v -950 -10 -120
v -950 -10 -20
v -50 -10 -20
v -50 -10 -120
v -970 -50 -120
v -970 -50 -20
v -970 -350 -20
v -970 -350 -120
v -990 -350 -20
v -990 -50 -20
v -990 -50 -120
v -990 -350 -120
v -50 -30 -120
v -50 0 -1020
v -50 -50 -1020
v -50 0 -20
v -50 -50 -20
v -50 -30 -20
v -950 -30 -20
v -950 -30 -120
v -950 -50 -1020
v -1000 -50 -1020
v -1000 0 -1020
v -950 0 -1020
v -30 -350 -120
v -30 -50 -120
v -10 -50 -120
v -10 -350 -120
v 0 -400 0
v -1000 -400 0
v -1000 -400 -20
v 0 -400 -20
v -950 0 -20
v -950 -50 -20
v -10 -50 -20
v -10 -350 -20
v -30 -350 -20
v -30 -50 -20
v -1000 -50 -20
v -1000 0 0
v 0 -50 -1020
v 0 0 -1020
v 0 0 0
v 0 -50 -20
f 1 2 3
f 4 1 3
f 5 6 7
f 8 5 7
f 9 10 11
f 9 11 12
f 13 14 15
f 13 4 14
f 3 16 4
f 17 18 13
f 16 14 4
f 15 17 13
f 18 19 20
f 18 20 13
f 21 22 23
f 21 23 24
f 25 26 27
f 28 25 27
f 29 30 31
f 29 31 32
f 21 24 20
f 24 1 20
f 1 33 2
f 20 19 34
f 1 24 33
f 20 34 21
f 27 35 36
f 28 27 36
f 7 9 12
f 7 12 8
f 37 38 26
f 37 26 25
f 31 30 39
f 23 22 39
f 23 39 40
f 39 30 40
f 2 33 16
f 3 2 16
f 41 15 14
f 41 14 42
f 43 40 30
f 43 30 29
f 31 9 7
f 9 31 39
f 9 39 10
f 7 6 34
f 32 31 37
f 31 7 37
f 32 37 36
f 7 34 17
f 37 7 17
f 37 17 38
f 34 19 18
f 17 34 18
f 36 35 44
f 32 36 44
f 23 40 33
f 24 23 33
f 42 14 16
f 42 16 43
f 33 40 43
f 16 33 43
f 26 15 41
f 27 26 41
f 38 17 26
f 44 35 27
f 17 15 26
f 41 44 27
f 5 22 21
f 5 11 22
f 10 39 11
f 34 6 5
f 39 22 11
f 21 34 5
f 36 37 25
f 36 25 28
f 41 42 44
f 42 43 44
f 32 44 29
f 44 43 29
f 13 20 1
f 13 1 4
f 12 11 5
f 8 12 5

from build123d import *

# Parameters (mm, degrees)
F0_W     = 1000
F0_H     = 400
F1_DEPTH = 20
F2_W     = 50
F2_H     = 50
F3_DEPTH = 1000
F4_W     = 900
F4_H     = 20
F4_W_2   = 20
F4_H_2   = 300
F5_DEPTH = 100


with BuildPart() as f1:
    # F0 (on Top) → F1 (new body)
    with BuildSketch(Plane.XY):
        with Locations((-500, -200)):
            Rectangle(F0_W, F0_H)
    extrude(amount=-F1_DEPTH)

    # F2 (on face) → F3 (join)
    with BuildSketch(Plane(origin=(0, 0, -20), x_dir=(1, 0, 0), z_dir=(0, 0, -1))):
        with Locations((-25, 25)):
            Rectangle(F2_W, F2_H)
        with Locations((-975, 25)):
            Rectangle(F2_W, F2_H)
    extrude(amount=F3_DEPTH)

    # F4 (on face) → F5 (join)
    with BuildSketch(Plane(origin=(0, 0, -20), x_dir=(1, 0, 0), z_dir=(0, 0, -1))):
        with Locations((-500, 20)):
            Rectangle(F4_W, F4_H)
        with Locations((-20, 200)):
            Rectangle(F4_W_2, F4_H_2)
        with Locations((-980, 200)):
            Rectangle(F4_W_2, F4_H_2)
    extrude(amount=F5_DEPTH)


solid = f1.part
